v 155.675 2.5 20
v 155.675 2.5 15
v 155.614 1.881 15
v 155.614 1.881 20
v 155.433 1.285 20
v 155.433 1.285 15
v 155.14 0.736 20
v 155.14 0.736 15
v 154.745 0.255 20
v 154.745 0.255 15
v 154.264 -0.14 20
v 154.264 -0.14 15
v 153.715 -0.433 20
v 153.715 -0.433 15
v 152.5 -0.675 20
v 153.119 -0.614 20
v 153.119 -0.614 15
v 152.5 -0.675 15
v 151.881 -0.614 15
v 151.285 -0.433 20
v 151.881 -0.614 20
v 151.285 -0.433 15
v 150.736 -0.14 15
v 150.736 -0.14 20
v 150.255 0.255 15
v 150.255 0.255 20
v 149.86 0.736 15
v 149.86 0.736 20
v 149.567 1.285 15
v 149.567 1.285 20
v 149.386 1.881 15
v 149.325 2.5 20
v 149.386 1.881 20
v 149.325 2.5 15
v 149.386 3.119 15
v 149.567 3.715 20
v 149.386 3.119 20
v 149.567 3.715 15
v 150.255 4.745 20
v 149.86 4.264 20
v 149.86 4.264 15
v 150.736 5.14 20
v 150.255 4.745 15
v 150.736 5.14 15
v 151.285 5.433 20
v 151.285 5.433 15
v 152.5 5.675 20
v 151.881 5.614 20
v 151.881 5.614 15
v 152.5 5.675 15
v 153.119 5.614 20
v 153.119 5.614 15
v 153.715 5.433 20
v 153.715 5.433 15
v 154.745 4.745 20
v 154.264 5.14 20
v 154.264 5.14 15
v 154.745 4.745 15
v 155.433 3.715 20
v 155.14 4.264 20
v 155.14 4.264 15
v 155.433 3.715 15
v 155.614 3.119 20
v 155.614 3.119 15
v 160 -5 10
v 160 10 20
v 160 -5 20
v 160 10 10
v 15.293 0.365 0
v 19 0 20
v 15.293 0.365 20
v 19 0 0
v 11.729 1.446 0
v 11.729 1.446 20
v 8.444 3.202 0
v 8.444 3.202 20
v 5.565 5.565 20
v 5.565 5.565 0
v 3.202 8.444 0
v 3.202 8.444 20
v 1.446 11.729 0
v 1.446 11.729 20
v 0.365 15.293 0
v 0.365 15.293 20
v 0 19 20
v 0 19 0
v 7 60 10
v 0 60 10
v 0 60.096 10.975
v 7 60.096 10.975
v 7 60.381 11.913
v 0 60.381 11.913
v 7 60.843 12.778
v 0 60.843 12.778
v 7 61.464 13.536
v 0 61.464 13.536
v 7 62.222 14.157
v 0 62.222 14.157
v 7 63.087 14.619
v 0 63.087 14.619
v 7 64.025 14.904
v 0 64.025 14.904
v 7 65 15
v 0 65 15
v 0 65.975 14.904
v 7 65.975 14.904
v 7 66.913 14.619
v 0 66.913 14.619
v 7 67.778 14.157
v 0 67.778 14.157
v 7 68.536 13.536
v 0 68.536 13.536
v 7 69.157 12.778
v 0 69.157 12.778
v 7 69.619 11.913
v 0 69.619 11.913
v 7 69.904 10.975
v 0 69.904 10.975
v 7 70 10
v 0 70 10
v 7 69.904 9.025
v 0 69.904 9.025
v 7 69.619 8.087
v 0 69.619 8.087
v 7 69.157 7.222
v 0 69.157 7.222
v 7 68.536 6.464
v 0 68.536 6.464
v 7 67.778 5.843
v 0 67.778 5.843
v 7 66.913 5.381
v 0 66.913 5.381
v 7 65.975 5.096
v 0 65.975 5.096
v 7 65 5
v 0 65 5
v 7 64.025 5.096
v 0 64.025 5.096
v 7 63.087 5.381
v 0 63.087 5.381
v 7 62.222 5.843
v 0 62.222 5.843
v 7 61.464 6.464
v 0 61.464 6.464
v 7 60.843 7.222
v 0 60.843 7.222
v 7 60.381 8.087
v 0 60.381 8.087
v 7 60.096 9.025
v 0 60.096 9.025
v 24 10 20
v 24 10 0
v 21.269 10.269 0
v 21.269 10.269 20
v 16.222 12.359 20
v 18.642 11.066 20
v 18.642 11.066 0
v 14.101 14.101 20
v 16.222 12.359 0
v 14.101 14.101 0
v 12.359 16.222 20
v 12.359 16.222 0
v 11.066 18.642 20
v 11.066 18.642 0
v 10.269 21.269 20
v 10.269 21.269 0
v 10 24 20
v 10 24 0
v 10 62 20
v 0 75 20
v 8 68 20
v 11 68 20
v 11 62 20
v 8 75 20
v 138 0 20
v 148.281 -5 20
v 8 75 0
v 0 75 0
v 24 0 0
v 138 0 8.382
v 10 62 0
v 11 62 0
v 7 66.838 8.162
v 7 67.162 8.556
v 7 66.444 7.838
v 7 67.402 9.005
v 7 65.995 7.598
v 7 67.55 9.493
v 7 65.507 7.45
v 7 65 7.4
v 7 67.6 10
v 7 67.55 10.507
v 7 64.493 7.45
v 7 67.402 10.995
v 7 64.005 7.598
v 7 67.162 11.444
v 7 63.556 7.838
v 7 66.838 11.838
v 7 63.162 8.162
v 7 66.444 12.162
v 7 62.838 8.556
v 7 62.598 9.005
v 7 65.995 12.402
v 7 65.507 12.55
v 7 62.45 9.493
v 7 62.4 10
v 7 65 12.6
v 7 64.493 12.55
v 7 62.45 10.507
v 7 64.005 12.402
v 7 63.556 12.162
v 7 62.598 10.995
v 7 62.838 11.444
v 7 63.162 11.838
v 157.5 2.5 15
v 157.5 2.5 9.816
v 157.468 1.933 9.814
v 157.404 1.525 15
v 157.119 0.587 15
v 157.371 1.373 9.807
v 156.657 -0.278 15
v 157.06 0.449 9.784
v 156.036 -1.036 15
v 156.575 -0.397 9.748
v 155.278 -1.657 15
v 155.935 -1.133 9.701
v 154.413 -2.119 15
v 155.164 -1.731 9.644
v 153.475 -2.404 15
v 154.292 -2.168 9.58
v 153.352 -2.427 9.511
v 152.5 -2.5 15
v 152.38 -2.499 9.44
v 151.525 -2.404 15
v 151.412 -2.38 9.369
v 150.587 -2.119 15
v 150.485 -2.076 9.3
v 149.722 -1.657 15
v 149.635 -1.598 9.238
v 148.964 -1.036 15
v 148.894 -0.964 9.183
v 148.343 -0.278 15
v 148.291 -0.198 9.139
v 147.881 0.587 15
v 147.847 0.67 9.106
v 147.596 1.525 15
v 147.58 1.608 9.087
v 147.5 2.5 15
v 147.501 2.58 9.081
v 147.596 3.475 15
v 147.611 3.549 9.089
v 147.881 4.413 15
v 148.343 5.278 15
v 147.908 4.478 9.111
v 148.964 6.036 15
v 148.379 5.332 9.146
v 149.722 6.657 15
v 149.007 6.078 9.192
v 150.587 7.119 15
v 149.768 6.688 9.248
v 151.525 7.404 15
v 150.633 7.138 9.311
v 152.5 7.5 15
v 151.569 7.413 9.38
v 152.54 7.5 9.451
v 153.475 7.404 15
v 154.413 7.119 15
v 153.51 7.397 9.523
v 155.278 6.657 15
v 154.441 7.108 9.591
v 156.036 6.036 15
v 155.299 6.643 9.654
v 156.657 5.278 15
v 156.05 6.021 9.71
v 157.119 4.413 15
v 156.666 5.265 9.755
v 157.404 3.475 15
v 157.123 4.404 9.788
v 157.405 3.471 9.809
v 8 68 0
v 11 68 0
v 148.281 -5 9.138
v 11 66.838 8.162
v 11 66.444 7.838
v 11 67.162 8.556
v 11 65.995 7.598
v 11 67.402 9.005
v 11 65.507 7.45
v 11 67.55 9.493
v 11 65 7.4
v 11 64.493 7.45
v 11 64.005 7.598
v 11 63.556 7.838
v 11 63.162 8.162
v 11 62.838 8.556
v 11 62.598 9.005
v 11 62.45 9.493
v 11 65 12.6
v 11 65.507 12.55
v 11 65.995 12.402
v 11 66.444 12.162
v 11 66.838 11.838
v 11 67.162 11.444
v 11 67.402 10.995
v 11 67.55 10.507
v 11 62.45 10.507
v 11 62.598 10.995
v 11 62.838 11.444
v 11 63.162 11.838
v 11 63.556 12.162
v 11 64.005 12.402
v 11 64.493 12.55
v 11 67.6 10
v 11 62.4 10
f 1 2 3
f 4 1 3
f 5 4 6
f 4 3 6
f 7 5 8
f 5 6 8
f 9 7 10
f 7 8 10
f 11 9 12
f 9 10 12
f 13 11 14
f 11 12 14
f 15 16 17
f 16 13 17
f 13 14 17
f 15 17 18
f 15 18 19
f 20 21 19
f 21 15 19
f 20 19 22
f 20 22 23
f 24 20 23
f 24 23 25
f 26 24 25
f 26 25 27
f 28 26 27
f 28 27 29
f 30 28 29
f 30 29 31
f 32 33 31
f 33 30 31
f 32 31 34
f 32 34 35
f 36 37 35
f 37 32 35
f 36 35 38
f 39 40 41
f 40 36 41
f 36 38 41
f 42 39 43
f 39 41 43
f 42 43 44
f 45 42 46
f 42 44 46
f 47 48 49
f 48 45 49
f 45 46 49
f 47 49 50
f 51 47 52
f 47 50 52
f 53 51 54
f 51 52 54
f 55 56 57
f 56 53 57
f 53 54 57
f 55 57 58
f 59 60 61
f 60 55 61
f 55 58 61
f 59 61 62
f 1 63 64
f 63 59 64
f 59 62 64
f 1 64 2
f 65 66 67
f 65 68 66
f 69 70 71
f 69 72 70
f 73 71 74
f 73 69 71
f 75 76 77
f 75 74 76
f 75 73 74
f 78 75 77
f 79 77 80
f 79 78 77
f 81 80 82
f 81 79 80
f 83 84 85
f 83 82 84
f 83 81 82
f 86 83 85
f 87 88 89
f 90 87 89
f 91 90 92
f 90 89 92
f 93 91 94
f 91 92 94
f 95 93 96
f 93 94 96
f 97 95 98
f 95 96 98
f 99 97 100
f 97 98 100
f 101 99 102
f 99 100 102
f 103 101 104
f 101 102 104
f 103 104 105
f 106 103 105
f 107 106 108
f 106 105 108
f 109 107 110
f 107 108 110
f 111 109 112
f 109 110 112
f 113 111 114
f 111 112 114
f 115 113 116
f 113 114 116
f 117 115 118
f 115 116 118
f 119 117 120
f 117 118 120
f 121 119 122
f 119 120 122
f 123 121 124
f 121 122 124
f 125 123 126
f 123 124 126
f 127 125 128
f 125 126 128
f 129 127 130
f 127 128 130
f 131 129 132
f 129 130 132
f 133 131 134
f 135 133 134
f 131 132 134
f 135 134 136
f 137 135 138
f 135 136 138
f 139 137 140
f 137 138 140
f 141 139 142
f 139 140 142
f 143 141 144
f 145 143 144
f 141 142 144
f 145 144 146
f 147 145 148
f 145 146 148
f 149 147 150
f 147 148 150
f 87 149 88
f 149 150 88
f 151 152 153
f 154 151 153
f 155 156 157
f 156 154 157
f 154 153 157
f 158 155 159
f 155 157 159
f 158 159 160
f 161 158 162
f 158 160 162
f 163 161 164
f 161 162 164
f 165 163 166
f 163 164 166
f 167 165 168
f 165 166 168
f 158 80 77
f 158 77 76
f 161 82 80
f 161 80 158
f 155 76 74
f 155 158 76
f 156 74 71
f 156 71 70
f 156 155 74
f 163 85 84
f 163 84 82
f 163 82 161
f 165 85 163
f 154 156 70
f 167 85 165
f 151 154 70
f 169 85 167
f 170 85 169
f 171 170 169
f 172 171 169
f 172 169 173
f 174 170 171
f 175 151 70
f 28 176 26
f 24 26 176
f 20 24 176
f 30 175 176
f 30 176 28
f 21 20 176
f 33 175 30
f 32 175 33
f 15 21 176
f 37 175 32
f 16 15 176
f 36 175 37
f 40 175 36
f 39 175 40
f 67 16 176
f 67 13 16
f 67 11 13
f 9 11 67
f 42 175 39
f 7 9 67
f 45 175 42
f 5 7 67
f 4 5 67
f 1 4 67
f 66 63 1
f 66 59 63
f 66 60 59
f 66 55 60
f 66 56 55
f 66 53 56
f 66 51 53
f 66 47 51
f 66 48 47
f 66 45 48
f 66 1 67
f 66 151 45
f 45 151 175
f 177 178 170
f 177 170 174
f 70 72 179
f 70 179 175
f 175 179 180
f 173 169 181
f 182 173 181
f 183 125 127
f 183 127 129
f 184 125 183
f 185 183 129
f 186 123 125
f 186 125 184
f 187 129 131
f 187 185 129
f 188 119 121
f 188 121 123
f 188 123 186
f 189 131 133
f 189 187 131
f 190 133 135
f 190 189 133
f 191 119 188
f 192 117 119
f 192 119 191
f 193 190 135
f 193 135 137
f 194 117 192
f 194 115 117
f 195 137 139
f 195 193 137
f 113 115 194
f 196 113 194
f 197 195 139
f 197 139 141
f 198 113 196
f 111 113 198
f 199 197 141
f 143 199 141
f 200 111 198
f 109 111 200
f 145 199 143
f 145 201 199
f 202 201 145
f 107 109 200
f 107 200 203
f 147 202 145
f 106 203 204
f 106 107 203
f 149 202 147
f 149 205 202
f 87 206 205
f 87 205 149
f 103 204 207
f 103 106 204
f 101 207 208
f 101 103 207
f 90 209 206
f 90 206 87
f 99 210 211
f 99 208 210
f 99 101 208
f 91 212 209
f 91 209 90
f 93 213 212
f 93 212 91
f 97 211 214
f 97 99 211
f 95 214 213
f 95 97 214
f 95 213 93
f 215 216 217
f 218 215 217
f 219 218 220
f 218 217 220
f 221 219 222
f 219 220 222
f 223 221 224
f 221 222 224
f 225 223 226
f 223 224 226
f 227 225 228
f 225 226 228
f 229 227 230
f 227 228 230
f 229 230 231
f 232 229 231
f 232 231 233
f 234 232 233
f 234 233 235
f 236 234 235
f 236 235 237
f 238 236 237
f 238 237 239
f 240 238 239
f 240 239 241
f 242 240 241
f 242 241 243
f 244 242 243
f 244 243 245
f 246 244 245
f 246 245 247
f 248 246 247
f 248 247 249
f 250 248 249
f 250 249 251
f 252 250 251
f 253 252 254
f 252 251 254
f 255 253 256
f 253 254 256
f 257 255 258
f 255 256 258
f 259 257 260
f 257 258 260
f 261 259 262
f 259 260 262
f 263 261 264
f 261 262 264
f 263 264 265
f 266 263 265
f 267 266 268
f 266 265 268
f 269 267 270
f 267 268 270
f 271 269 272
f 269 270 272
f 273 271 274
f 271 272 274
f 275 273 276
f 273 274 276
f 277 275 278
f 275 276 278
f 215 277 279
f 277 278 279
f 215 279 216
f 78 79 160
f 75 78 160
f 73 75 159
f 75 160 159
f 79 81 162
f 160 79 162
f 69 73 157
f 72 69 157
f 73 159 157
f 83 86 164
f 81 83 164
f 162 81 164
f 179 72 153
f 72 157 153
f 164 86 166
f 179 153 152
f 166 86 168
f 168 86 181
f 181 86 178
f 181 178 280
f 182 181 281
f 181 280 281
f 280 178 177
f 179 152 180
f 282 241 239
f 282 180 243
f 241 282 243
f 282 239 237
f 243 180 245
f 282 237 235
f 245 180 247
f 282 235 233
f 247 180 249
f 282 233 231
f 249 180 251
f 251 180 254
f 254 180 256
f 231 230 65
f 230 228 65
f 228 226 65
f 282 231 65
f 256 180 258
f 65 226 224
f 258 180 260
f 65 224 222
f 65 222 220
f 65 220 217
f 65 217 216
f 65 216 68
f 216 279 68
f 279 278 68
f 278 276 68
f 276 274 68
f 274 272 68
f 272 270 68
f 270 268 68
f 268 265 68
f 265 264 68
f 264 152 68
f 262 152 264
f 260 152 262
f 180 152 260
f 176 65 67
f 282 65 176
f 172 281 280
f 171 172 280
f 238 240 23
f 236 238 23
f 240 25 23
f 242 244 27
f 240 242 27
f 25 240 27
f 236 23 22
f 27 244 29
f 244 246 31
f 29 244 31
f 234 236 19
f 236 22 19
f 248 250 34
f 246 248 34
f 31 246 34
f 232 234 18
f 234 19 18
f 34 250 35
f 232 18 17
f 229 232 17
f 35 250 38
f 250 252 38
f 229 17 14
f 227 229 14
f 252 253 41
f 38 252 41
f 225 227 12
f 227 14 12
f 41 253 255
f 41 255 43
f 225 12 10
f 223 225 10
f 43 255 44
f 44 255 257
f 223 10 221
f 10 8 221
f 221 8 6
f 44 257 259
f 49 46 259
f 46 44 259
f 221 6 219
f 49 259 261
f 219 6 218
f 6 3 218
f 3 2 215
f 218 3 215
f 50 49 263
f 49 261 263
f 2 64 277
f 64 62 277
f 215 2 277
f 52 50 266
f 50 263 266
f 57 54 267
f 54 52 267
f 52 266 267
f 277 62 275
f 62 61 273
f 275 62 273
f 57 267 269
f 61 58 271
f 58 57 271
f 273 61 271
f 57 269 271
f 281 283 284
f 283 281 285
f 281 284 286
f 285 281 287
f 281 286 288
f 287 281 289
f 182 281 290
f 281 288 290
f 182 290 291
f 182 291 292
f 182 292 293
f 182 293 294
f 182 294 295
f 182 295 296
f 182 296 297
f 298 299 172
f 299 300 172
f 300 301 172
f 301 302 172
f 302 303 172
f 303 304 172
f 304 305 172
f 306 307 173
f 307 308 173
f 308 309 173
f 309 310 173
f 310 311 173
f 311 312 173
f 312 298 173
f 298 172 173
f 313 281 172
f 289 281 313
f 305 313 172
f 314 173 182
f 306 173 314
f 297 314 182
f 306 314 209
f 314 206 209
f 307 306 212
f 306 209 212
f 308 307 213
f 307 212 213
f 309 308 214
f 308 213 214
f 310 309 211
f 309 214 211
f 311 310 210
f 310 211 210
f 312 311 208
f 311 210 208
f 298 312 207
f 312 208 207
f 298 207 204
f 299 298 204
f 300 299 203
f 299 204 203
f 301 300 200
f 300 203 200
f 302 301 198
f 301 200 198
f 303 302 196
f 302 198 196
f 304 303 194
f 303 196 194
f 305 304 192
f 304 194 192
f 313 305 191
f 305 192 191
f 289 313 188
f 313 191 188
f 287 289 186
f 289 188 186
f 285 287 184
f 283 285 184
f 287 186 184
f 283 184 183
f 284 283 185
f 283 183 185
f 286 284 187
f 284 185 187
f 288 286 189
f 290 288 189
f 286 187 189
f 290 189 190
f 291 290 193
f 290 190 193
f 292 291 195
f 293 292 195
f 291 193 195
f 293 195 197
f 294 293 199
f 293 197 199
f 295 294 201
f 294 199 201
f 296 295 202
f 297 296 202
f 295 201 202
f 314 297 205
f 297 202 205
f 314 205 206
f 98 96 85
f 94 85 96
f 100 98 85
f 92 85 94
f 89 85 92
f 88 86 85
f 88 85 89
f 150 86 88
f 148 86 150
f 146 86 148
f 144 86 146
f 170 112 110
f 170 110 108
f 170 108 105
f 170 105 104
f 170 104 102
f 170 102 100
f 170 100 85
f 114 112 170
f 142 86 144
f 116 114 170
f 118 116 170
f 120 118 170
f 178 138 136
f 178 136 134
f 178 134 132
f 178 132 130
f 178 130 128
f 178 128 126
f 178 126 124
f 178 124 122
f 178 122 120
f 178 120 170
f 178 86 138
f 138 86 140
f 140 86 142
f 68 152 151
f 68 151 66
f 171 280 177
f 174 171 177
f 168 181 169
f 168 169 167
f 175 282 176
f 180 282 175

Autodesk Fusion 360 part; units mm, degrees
sketch "Sketch1" plane through (0, 0, 0) normal (0, 0, 1) x (1, 0, 0)
  line L0 (0, 19) -> (0, 75)
  line L1 (0, 75) -> (8, 75)
  line L2 (10, 68) -> (10, 24)
  line L3 (24, 10) -> (160, 10)
  line L4 (10, 68) -> (8, 68)
  line L5 (8, 68) -> (8, 75)
  arc A0 (0, 19) -> (19, 0) centre (19, 19) ccw
  arc A1 (10, 24) -> (24, 10) centre (24, 24) ccw
  circle A2 centre (152.5, 2.5) radius 3.175
  circle A3 centre (152.5, 2.5) radius 5
  line L6 (160, -5) -> (148.2812, -5)
  line L7 (148.2812, -5) -> (138, 0)
  line L8 (19, 0) -> (138, 0)
  line L9 (160, 10) -> (160, -5)
  line L10 (24, 10) -> (24, 0)
  point P0 (10, 10)
  dimension "d1" = 7
  dimension "d2" = 75
  dimension "d5" = 19
  dimension "d6" = 14
  dimension "d13" = 6.35
  dimension "d14" = 10
  dimension "d18" = 7.5
  dimension "d19" = 15
  dimension "d20" = 119
  dimension "d42" = 7.5
  dimension "d43" = 160
extrude "Extrude1" add sketch "Sketch1" along normal blind 20 contours L0 L1 L2 L4 L5 A0 A1 L8 L10 | L3 L6 L7 L8 L9 L10 | A3
extrude "Extrude3" cut sketch "Sketch1" along normal blind 15 contours A3
sketch "Sketch2" plane through (0, 0, 0) normal (-1, 0, 0) x (0, -1, 0)
  line L0 (-75, 0) -> (-19, 0)
  line L1 (-19, 0) -> (-19, 20)
  line L2 (-19, 20) -> (-75, 20)
  line L3 (-75, 20) -> (-75, 0)
  circle A0 centre (-65, 10) radius 2.6
  circle A1 centre (-65, 10) radius 5
  line L4 (-68, 20) -> (-68, 0)
  line L5 (-62, 20) -> (-62, 0)
  dimension "d23" = 5.2
  dimension "d24" = 10
  dimension "d25" = 10
  dimension "d26" = 10
  dimension "d31" = 20
  dimension "d32" = 20
  dimension "d33" = 7
  dimension "d34" = 13
extrude "Extrude4" cut sketch "Sketch2" against normal blind 10 contours A0
extrude "Extrude5" cut sketch "Sketch2" against normal blind 7 contours A1 L4 L5 | A1 L4 | A1 L5
extrude "Extrude6" add sketch "Sketch2" against normal blind 1 from surface at -10 contours L0 A1 L4 L5 | A1 L4 L5 | L2 A1 L4 L5
sketch "Sketch5" plane through (0, 10, 0) normal (0, 1, 0) x (-1, 0, 0)
  line L0 (-160, 0) -> (-24, 0)
  line L1 (-24, 0) -> (-24, 20)
  line L2 (-24, 20) -> (-160, 20)
  line L3 (-160, 20) -> (-160, 0)
  line L4 (-24, 0) -> (-160, 10)
extrude "Extrude8" cut sketch "Sketch5" against normal blind 15 contours L0 L3 L4
equation "d20 = 69 mm + 50 mm"
